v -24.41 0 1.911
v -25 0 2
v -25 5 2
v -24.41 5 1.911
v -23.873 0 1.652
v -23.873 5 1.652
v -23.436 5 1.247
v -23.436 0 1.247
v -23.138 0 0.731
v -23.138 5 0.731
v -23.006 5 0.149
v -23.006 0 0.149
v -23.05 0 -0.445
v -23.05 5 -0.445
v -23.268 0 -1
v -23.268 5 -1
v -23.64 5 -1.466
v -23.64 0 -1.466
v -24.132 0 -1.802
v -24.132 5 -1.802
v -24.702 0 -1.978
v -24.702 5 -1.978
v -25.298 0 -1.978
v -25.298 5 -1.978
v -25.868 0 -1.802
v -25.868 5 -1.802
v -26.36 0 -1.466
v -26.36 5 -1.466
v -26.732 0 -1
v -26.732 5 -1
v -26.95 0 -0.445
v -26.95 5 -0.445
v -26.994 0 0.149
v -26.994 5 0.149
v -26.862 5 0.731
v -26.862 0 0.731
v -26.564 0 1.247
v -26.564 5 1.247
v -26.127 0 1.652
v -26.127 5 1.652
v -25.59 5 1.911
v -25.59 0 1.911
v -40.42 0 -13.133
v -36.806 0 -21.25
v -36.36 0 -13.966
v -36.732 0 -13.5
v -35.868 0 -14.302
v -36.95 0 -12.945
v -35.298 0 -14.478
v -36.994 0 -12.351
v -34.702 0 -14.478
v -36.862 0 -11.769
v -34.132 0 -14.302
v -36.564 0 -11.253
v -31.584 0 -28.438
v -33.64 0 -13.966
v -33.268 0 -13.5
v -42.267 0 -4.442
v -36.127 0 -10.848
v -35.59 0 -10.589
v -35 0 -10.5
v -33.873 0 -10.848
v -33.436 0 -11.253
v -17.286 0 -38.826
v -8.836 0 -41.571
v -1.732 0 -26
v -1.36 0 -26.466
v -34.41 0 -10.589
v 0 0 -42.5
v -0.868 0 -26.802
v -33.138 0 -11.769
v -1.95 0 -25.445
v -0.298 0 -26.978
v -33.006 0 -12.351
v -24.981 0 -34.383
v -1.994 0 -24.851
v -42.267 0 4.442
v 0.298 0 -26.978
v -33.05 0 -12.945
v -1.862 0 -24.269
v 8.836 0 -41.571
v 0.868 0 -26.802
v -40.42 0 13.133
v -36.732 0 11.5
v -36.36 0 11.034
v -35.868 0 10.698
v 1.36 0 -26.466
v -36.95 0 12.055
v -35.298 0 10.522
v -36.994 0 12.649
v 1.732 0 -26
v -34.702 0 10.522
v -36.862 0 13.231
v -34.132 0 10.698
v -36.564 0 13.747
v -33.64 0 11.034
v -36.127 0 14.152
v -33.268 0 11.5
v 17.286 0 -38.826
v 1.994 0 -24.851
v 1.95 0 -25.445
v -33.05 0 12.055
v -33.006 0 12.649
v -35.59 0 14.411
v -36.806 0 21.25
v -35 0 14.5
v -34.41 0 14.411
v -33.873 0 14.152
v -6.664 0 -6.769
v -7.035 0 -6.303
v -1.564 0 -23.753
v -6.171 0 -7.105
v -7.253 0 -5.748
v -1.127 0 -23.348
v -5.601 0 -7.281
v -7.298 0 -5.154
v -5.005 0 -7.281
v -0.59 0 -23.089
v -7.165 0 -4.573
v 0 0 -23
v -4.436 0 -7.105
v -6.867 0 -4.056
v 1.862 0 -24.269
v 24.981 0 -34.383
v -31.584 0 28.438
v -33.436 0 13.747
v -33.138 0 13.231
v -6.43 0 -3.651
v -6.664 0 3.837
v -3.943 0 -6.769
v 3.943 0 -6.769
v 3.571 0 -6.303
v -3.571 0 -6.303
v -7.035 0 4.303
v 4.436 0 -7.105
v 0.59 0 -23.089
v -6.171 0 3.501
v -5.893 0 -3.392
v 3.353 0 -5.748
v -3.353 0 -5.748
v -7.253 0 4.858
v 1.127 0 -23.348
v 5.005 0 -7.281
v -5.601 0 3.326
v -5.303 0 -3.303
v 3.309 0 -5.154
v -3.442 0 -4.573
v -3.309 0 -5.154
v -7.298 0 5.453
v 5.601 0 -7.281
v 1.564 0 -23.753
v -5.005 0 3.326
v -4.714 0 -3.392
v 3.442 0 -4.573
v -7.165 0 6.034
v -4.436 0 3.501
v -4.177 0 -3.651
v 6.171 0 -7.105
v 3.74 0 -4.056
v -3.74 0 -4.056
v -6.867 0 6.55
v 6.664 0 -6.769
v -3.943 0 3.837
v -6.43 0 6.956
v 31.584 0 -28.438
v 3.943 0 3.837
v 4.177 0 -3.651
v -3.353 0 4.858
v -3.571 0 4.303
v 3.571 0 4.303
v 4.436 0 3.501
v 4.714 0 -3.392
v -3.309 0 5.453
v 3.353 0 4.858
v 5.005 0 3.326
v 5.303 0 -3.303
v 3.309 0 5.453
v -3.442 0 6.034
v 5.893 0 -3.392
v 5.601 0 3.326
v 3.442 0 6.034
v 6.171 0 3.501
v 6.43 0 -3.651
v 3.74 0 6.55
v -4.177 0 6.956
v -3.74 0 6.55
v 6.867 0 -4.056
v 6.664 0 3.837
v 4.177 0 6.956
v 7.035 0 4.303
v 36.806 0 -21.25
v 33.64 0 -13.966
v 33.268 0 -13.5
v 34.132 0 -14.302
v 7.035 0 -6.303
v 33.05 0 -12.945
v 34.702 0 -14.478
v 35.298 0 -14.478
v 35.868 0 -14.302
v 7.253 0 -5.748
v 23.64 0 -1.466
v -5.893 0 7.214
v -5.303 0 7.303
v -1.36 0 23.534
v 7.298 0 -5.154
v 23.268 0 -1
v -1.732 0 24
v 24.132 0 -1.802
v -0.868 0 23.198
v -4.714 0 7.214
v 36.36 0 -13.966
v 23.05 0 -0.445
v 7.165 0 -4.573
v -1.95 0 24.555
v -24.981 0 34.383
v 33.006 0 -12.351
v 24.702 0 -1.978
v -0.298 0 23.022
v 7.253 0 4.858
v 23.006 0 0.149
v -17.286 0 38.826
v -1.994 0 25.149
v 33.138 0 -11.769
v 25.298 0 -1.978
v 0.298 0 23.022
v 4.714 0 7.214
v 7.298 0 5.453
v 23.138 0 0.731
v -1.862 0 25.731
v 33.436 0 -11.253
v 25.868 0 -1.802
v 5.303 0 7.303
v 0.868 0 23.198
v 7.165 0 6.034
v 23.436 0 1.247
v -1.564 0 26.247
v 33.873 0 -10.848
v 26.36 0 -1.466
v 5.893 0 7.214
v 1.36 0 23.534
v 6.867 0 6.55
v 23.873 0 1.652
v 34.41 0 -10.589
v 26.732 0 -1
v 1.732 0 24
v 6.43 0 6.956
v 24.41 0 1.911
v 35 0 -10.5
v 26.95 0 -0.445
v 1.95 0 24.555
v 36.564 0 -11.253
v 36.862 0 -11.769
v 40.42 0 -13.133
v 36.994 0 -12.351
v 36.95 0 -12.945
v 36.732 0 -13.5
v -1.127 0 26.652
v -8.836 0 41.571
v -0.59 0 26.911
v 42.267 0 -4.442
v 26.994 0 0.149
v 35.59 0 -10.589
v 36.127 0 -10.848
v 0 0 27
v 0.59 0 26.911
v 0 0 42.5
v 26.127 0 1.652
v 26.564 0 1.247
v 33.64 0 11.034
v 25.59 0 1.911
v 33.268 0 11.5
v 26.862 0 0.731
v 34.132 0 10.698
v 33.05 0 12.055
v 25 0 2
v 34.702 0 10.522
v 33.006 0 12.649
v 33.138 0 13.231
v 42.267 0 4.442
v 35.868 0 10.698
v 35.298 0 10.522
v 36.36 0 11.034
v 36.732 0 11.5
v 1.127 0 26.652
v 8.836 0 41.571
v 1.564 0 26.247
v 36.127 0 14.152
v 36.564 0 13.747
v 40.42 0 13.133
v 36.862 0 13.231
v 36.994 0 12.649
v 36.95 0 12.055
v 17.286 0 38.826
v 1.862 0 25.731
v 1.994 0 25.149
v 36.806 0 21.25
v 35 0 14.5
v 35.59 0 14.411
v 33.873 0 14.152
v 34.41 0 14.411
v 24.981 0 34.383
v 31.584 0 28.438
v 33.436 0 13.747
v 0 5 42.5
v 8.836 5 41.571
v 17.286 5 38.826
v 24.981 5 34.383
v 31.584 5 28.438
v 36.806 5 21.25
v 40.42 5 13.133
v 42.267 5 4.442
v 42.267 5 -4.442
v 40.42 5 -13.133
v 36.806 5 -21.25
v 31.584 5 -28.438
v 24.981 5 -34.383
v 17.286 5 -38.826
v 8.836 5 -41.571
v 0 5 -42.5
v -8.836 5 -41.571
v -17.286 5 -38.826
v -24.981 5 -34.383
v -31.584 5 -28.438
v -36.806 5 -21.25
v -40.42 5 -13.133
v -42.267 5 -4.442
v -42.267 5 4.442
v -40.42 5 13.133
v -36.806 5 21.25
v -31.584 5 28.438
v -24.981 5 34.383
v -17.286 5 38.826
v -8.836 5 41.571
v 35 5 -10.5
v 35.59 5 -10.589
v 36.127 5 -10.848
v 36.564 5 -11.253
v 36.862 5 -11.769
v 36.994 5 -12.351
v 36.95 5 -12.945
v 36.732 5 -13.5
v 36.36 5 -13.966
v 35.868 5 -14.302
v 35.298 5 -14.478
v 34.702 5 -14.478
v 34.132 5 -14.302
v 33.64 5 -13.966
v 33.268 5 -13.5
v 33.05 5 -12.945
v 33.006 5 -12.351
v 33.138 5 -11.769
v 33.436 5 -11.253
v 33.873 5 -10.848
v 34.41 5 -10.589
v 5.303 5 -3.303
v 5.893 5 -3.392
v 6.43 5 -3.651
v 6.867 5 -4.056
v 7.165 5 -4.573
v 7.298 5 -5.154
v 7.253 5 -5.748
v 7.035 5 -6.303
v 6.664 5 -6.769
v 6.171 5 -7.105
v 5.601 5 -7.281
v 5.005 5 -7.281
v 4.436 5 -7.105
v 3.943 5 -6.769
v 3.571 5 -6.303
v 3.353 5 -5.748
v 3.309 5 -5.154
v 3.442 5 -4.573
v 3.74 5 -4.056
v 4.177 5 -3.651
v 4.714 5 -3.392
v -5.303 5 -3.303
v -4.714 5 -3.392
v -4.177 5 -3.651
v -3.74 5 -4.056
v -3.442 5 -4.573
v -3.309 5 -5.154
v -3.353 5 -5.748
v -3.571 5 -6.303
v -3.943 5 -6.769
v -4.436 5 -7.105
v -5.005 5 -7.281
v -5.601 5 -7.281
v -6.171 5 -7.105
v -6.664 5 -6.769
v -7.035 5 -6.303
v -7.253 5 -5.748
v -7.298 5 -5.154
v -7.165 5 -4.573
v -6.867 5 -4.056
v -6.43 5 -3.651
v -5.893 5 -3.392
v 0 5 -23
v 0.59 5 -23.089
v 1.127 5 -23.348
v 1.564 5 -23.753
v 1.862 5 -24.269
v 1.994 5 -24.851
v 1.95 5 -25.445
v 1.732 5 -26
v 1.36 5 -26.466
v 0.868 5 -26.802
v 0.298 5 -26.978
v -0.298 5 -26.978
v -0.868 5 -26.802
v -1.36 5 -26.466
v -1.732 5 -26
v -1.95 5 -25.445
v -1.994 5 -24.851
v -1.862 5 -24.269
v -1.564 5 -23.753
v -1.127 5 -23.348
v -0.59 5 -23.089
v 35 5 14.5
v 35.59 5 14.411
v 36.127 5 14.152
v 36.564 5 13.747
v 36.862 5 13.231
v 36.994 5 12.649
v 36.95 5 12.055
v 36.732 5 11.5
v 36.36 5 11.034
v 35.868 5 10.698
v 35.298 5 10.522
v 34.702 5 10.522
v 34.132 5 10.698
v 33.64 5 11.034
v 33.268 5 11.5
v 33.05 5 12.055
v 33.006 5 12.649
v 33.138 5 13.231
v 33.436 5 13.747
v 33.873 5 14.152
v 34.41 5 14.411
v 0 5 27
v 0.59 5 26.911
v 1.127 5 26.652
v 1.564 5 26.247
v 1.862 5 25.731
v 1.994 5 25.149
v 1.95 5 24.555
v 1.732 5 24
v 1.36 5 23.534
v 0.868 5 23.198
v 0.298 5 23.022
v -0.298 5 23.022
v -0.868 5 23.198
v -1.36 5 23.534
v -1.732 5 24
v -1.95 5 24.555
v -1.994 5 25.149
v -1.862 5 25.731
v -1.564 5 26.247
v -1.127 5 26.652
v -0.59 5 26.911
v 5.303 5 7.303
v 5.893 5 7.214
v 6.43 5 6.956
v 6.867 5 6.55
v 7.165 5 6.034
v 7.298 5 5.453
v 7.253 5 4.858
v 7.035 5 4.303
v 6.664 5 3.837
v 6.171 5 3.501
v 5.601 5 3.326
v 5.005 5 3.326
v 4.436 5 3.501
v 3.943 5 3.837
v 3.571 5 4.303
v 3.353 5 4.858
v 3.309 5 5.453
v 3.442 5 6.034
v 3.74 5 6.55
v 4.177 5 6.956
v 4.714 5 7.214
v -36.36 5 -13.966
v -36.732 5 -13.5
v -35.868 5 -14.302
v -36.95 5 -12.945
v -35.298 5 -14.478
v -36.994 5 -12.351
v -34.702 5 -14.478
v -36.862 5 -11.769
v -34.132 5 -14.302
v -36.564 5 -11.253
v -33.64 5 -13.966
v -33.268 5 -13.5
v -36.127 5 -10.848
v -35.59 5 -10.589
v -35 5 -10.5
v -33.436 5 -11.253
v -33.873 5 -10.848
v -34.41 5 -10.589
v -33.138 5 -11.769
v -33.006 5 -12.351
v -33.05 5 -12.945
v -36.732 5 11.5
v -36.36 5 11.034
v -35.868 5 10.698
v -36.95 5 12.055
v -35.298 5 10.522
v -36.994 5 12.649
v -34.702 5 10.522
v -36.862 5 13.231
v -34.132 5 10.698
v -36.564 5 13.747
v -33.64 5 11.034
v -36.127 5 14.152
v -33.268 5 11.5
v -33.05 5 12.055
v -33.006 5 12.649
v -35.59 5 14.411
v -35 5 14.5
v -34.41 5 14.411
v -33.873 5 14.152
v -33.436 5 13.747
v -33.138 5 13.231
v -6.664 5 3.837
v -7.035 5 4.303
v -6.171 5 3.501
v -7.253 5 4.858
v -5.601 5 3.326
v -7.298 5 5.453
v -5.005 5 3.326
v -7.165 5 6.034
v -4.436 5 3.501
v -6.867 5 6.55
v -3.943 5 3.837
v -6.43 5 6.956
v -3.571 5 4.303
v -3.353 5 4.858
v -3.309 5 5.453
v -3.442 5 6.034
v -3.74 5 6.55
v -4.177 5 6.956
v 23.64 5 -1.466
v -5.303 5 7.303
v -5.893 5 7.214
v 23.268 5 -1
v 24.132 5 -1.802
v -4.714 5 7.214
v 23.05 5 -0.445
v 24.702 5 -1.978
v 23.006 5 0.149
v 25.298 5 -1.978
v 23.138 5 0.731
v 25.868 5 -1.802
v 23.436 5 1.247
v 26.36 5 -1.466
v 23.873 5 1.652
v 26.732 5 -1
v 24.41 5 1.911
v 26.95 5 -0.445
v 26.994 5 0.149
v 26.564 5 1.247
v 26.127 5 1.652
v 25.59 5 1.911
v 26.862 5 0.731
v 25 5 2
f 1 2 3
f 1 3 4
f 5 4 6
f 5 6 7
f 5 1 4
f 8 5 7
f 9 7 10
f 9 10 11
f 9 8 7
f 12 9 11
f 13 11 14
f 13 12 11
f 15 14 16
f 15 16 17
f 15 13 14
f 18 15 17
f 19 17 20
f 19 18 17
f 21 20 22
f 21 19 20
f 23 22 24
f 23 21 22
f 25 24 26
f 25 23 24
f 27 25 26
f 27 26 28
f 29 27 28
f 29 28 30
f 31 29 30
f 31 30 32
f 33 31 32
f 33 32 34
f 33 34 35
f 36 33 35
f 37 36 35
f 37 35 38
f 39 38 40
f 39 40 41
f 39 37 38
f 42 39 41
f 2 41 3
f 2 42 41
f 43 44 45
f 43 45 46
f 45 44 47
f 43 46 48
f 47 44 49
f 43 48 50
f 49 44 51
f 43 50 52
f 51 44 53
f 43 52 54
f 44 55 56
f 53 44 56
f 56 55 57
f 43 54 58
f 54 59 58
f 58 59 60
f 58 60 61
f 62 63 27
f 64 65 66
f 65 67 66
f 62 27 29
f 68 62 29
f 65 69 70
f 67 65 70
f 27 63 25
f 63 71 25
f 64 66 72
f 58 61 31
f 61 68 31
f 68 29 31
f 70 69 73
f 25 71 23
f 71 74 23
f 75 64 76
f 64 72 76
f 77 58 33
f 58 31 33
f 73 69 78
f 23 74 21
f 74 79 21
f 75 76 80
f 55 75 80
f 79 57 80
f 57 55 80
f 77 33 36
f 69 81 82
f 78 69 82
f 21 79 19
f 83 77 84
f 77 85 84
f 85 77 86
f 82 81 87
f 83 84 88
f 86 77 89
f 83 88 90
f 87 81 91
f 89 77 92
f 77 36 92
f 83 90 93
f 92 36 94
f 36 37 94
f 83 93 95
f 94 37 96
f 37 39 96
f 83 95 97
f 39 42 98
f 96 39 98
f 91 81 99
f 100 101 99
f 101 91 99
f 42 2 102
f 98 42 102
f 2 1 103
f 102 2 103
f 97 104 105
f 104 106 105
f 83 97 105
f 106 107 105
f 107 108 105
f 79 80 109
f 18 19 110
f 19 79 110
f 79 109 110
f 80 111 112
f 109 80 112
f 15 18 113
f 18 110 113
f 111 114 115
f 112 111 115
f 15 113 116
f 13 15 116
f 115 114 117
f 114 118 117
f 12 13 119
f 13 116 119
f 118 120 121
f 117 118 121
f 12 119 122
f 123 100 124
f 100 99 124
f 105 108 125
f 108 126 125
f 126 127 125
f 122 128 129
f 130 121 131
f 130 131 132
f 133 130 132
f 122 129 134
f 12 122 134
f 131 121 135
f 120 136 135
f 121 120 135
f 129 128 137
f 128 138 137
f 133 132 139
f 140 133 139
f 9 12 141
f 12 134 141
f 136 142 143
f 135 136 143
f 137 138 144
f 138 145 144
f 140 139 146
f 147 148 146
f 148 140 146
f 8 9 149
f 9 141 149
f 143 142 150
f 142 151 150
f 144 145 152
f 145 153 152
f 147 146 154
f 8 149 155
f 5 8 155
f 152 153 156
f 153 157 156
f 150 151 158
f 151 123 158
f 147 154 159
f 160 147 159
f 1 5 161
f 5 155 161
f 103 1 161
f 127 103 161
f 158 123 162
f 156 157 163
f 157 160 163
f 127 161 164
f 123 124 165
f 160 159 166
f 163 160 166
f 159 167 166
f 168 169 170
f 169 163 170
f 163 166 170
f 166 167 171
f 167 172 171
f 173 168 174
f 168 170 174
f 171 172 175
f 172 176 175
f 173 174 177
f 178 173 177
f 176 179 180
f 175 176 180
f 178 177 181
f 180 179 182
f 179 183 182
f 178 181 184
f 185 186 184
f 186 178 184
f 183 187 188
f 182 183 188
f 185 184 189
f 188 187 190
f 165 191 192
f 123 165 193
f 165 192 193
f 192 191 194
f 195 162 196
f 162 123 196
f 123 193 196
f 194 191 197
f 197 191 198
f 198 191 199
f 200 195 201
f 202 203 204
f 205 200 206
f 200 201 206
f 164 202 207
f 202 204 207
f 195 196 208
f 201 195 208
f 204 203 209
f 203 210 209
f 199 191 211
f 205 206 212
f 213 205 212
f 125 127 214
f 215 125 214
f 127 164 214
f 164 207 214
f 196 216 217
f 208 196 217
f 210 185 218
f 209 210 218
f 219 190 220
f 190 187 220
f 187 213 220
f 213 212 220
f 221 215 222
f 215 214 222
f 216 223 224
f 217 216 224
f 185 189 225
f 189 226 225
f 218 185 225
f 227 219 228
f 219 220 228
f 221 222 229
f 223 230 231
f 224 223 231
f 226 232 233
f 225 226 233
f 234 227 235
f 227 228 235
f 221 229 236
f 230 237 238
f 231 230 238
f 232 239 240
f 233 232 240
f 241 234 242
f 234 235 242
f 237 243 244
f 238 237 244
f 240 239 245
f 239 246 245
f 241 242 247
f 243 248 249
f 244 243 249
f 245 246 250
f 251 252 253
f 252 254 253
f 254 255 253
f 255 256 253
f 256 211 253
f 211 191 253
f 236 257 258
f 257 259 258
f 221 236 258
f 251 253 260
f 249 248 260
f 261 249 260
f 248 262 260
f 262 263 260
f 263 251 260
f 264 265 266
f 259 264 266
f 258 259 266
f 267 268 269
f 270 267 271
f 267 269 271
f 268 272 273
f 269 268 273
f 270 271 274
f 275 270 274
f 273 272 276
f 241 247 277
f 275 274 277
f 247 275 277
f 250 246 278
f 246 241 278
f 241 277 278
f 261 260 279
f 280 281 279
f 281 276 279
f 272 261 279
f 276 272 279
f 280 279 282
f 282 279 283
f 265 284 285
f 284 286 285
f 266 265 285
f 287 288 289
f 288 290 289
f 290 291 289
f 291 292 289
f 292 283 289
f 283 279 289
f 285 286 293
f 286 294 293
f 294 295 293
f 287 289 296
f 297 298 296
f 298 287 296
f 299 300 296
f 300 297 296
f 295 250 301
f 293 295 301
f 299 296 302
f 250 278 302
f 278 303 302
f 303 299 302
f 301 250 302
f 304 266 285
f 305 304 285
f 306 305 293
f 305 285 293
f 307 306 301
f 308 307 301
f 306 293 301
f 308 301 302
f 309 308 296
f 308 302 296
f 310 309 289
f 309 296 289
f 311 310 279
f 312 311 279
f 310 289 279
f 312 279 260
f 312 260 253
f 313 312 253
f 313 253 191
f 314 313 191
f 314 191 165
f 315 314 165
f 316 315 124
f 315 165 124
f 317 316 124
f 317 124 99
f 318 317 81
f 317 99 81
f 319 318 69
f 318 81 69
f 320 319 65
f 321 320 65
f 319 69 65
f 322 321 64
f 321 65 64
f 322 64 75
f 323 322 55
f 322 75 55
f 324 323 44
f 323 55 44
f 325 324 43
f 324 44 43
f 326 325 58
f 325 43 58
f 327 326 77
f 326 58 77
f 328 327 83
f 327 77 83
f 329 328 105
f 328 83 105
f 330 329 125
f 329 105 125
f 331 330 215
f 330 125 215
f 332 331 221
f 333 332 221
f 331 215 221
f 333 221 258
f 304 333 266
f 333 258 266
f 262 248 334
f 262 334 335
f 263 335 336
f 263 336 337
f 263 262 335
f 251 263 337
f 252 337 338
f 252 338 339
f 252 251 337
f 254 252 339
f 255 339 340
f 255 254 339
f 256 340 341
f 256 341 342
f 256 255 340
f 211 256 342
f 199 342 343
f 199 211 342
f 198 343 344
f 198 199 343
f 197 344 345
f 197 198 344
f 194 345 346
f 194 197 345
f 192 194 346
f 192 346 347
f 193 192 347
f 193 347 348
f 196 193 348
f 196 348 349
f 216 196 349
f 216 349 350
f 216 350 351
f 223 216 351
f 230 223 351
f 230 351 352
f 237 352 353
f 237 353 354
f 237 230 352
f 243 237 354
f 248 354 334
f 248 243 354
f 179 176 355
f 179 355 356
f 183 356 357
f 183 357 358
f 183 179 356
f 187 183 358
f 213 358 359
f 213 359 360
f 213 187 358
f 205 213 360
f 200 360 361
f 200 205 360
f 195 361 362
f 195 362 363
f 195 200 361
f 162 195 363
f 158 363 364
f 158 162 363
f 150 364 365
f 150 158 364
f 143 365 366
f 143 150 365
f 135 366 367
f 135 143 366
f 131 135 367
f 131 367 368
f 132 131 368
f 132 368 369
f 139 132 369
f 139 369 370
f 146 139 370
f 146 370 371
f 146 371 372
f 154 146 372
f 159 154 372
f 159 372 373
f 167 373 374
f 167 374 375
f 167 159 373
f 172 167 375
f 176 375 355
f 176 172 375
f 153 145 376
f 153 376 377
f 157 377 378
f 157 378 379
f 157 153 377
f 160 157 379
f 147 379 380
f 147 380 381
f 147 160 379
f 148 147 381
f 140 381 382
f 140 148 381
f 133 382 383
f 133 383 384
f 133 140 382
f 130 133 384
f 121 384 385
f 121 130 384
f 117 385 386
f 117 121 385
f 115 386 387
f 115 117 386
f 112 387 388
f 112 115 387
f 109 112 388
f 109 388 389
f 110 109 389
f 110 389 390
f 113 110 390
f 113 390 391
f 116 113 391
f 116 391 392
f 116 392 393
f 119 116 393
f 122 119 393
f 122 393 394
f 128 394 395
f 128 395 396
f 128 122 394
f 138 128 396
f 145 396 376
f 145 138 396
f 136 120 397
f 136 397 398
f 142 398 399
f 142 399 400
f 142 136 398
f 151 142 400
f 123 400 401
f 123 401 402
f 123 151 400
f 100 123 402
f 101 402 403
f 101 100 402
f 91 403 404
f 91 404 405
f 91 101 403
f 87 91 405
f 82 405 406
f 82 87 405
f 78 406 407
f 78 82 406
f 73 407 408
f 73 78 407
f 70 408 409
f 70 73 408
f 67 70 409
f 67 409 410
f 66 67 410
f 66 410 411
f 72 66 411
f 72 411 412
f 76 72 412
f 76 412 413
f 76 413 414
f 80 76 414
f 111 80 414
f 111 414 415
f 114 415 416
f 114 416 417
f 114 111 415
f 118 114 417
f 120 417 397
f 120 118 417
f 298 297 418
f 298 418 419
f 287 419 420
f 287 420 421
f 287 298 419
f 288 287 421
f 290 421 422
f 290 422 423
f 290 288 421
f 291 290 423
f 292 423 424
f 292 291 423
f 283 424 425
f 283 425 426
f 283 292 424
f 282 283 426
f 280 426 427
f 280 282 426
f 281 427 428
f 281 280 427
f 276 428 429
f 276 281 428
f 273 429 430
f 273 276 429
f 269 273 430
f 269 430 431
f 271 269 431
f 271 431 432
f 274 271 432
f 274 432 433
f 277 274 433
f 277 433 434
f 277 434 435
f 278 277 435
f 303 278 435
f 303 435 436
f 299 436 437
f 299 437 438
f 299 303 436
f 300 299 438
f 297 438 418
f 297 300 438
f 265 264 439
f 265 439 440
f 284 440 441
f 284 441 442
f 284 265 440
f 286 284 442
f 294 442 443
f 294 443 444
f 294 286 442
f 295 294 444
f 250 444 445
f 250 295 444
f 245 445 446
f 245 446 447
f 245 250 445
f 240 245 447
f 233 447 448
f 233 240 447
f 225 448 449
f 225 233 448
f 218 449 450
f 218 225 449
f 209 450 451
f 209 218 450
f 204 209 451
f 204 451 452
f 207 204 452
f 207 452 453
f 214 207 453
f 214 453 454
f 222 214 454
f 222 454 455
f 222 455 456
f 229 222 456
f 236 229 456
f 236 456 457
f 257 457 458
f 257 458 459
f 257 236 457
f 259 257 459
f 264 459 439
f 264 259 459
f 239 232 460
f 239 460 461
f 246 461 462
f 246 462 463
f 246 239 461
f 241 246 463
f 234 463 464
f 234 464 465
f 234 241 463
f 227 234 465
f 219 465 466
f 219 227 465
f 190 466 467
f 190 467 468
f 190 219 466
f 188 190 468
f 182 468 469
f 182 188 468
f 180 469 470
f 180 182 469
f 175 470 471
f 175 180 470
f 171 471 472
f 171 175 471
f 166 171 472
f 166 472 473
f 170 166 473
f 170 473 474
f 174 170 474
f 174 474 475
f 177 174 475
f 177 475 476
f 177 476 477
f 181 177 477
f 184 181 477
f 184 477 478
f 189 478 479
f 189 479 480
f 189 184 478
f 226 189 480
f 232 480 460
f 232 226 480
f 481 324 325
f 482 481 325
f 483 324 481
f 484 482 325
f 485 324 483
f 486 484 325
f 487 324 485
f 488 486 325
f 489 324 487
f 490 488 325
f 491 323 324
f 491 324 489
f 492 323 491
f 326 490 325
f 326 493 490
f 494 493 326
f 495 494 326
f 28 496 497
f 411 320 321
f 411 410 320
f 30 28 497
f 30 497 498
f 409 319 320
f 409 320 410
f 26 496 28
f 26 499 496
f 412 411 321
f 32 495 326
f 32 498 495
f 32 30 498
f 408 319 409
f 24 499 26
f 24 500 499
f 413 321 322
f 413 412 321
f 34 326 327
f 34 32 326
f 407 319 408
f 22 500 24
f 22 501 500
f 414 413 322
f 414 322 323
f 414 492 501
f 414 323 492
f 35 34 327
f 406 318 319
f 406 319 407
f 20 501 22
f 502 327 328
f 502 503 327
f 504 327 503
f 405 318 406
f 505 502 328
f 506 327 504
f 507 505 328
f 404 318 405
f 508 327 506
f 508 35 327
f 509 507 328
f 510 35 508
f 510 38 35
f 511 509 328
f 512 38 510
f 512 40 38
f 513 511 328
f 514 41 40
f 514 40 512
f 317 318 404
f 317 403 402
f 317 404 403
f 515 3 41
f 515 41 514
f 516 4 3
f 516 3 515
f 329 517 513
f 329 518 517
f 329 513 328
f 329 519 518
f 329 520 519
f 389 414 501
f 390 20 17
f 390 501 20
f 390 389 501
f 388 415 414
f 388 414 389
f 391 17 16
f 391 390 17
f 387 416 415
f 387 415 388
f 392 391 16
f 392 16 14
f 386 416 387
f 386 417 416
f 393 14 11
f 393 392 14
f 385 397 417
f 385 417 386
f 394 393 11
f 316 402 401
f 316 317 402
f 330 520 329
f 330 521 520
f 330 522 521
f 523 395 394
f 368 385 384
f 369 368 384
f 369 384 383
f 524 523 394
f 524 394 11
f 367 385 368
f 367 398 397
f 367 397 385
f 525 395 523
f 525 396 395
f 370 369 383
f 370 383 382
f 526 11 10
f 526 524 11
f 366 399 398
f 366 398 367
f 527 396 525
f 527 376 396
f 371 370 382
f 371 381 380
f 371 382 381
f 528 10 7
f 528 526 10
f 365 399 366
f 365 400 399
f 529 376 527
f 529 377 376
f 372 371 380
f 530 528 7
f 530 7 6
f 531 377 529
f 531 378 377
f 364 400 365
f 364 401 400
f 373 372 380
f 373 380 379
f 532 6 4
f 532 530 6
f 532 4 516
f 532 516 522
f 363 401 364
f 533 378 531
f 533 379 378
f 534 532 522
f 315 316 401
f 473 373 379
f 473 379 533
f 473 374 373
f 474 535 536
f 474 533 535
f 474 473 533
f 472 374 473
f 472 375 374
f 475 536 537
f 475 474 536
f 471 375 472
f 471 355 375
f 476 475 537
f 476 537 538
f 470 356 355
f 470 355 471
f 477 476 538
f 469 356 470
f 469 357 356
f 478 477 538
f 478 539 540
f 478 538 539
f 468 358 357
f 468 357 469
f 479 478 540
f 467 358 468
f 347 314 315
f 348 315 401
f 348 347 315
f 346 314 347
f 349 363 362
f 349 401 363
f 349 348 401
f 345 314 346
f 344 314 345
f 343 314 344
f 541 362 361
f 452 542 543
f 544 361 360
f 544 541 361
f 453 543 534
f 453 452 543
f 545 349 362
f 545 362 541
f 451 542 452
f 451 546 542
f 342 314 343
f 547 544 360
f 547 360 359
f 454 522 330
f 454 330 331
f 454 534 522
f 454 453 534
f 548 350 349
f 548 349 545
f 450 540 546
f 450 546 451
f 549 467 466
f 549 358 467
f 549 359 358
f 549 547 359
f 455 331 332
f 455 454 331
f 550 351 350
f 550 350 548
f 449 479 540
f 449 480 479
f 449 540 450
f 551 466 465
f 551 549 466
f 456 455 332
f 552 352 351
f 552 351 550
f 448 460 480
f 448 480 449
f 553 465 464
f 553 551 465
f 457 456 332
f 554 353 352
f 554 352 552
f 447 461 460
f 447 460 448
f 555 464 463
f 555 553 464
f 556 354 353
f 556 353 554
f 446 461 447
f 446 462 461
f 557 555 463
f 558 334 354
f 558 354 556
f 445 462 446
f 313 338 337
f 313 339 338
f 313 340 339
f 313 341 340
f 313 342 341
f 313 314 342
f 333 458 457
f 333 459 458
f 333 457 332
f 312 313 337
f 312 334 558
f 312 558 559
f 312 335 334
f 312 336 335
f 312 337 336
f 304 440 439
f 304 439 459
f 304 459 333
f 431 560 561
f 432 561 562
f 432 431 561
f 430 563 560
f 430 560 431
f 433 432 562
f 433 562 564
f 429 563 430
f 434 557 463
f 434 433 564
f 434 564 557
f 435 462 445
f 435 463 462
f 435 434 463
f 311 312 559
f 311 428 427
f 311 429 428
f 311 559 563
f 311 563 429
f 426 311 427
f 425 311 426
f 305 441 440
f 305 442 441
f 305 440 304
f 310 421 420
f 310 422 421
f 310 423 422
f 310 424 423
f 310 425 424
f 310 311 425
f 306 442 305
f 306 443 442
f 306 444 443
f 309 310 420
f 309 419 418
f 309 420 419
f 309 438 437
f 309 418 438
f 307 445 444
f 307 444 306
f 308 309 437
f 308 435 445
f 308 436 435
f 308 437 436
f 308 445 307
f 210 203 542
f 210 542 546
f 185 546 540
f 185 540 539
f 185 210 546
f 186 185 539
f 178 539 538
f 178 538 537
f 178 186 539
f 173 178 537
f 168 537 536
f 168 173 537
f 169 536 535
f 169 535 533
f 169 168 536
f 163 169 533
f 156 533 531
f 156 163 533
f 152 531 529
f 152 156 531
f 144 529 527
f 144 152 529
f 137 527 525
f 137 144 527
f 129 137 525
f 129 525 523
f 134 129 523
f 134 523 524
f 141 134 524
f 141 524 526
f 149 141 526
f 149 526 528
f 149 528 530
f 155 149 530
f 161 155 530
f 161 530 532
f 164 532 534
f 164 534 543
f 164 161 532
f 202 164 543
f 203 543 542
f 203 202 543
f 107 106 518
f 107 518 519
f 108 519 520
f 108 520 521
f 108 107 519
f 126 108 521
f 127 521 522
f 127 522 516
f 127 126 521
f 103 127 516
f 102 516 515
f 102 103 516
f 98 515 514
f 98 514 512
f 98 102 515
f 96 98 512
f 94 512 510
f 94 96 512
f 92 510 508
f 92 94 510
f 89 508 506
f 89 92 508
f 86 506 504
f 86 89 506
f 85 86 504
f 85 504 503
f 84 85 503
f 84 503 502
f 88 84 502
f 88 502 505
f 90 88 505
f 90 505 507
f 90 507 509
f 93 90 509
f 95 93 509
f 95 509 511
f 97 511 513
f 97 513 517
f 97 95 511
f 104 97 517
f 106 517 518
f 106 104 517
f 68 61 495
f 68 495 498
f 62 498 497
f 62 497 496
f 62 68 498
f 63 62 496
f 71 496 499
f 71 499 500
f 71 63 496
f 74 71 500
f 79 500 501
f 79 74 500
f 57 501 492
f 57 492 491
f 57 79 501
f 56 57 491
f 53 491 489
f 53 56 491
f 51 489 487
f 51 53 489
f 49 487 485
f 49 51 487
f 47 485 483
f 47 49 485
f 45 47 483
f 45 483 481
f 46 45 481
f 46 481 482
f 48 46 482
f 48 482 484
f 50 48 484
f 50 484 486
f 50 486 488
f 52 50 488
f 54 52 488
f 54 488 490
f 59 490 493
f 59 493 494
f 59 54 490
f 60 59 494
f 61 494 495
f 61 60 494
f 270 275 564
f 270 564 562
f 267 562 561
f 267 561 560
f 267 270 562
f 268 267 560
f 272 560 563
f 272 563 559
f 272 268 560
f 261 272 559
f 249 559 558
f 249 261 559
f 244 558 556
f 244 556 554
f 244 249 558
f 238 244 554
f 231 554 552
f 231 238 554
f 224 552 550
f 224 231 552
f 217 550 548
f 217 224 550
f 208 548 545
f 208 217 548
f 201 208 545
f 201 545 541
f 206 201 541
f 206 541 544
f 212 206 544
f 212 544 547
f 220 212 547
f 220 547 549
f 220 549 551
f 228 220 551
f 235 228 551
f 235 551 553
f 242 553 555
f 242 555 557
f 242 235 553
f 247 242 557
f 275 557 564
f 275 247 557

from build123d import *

# Parameters (mm, degrees)
SKETCH_1_R      = 42.5
SKETCH_1_R_2    = 2
EXTRUDE_1_DEPTH = 5


with BuildPart() as part:
    # ｽｹｯﾁ1 → ﾎﾞｽ - 押し出し1 (new body)
    with BuildSketch(Plane(origin=(0, 0, 0), x_dir=(1, 0, 0), z_dir=(0, 1, 0))):
        with Locations(Location((0, 0, 0), (0, 0, 270))):
            Circle(SKETCH_1_R)
        with Locations(Location((5.303300859, 5.303300859, 0), (0, 0, 270))):
            Circle(SKETCH_1_R_2, mode=Mode.SUBTRACT)
        with Locations(Location((5.303300859, -5.303300859, 0), (0, 0, 270))):
            Circle(SKETCH_1_R_2, mode=Mode.SUBTRACT)
        with Locations(Location((-5.303300859, -5.303300859, 0), (0, 0, 270))):
            Circle(SKETCH_1_R_2, mode=Mode.SUBTRACT)
        with Locations(Location((-5.303300859, 5.303300859, 0), (0, 0, 270))):
            Circle(SKETCH_1_R_2, mode=Mode.SUBTRACT)
        with Locations(Location((25, 0, 0), (0, 0, 270))):
            Circle(SKETCH_1_R_2, mode=Mode.SUBTRACT)
        with Locations(Location((0, -25, 0), (0, 0, 270))):
            Circle(SKETCH_1_R_2, mode=Mode.SUBTRACT)
        with Locations(Location((-25, 0, 0), (0, 0, 270))):
            Circle(SKETCH_1_R_2, mode=Mode.SUBTRACT)
        with Locations(Location((0, 25, 0), (0, 0, 270))):
            Circle(SKETCH_1_R_2, mode=Mode.SUBTRACT)
        with Locations(Location((35, 12.5, 0), (0, 0, 270))):
            Circle(SKETCH_1_R_2, mode=Mode.SUBTRACT)
        with Locations(Location((35, -12.5, 0), (0, 0, 270))):
            Circle(SKETCH_1_R_2, mode=Mode.SUBTRACT)
        with Locations(Location((-35, -12.5, 0), (0, 0, 270))):
            Circle(SKETCH_1_R_2, mode=Mode.SUBTRACT)
        with Locations(Location((-35, 12.5, 0), (0, 0, 270))):
            Circle(SKETCH_1_R_2, mode=Mode.SUBTRACT)
    extrude(amount=EXTRUDE_1_DEPTH)


solid = part.part
